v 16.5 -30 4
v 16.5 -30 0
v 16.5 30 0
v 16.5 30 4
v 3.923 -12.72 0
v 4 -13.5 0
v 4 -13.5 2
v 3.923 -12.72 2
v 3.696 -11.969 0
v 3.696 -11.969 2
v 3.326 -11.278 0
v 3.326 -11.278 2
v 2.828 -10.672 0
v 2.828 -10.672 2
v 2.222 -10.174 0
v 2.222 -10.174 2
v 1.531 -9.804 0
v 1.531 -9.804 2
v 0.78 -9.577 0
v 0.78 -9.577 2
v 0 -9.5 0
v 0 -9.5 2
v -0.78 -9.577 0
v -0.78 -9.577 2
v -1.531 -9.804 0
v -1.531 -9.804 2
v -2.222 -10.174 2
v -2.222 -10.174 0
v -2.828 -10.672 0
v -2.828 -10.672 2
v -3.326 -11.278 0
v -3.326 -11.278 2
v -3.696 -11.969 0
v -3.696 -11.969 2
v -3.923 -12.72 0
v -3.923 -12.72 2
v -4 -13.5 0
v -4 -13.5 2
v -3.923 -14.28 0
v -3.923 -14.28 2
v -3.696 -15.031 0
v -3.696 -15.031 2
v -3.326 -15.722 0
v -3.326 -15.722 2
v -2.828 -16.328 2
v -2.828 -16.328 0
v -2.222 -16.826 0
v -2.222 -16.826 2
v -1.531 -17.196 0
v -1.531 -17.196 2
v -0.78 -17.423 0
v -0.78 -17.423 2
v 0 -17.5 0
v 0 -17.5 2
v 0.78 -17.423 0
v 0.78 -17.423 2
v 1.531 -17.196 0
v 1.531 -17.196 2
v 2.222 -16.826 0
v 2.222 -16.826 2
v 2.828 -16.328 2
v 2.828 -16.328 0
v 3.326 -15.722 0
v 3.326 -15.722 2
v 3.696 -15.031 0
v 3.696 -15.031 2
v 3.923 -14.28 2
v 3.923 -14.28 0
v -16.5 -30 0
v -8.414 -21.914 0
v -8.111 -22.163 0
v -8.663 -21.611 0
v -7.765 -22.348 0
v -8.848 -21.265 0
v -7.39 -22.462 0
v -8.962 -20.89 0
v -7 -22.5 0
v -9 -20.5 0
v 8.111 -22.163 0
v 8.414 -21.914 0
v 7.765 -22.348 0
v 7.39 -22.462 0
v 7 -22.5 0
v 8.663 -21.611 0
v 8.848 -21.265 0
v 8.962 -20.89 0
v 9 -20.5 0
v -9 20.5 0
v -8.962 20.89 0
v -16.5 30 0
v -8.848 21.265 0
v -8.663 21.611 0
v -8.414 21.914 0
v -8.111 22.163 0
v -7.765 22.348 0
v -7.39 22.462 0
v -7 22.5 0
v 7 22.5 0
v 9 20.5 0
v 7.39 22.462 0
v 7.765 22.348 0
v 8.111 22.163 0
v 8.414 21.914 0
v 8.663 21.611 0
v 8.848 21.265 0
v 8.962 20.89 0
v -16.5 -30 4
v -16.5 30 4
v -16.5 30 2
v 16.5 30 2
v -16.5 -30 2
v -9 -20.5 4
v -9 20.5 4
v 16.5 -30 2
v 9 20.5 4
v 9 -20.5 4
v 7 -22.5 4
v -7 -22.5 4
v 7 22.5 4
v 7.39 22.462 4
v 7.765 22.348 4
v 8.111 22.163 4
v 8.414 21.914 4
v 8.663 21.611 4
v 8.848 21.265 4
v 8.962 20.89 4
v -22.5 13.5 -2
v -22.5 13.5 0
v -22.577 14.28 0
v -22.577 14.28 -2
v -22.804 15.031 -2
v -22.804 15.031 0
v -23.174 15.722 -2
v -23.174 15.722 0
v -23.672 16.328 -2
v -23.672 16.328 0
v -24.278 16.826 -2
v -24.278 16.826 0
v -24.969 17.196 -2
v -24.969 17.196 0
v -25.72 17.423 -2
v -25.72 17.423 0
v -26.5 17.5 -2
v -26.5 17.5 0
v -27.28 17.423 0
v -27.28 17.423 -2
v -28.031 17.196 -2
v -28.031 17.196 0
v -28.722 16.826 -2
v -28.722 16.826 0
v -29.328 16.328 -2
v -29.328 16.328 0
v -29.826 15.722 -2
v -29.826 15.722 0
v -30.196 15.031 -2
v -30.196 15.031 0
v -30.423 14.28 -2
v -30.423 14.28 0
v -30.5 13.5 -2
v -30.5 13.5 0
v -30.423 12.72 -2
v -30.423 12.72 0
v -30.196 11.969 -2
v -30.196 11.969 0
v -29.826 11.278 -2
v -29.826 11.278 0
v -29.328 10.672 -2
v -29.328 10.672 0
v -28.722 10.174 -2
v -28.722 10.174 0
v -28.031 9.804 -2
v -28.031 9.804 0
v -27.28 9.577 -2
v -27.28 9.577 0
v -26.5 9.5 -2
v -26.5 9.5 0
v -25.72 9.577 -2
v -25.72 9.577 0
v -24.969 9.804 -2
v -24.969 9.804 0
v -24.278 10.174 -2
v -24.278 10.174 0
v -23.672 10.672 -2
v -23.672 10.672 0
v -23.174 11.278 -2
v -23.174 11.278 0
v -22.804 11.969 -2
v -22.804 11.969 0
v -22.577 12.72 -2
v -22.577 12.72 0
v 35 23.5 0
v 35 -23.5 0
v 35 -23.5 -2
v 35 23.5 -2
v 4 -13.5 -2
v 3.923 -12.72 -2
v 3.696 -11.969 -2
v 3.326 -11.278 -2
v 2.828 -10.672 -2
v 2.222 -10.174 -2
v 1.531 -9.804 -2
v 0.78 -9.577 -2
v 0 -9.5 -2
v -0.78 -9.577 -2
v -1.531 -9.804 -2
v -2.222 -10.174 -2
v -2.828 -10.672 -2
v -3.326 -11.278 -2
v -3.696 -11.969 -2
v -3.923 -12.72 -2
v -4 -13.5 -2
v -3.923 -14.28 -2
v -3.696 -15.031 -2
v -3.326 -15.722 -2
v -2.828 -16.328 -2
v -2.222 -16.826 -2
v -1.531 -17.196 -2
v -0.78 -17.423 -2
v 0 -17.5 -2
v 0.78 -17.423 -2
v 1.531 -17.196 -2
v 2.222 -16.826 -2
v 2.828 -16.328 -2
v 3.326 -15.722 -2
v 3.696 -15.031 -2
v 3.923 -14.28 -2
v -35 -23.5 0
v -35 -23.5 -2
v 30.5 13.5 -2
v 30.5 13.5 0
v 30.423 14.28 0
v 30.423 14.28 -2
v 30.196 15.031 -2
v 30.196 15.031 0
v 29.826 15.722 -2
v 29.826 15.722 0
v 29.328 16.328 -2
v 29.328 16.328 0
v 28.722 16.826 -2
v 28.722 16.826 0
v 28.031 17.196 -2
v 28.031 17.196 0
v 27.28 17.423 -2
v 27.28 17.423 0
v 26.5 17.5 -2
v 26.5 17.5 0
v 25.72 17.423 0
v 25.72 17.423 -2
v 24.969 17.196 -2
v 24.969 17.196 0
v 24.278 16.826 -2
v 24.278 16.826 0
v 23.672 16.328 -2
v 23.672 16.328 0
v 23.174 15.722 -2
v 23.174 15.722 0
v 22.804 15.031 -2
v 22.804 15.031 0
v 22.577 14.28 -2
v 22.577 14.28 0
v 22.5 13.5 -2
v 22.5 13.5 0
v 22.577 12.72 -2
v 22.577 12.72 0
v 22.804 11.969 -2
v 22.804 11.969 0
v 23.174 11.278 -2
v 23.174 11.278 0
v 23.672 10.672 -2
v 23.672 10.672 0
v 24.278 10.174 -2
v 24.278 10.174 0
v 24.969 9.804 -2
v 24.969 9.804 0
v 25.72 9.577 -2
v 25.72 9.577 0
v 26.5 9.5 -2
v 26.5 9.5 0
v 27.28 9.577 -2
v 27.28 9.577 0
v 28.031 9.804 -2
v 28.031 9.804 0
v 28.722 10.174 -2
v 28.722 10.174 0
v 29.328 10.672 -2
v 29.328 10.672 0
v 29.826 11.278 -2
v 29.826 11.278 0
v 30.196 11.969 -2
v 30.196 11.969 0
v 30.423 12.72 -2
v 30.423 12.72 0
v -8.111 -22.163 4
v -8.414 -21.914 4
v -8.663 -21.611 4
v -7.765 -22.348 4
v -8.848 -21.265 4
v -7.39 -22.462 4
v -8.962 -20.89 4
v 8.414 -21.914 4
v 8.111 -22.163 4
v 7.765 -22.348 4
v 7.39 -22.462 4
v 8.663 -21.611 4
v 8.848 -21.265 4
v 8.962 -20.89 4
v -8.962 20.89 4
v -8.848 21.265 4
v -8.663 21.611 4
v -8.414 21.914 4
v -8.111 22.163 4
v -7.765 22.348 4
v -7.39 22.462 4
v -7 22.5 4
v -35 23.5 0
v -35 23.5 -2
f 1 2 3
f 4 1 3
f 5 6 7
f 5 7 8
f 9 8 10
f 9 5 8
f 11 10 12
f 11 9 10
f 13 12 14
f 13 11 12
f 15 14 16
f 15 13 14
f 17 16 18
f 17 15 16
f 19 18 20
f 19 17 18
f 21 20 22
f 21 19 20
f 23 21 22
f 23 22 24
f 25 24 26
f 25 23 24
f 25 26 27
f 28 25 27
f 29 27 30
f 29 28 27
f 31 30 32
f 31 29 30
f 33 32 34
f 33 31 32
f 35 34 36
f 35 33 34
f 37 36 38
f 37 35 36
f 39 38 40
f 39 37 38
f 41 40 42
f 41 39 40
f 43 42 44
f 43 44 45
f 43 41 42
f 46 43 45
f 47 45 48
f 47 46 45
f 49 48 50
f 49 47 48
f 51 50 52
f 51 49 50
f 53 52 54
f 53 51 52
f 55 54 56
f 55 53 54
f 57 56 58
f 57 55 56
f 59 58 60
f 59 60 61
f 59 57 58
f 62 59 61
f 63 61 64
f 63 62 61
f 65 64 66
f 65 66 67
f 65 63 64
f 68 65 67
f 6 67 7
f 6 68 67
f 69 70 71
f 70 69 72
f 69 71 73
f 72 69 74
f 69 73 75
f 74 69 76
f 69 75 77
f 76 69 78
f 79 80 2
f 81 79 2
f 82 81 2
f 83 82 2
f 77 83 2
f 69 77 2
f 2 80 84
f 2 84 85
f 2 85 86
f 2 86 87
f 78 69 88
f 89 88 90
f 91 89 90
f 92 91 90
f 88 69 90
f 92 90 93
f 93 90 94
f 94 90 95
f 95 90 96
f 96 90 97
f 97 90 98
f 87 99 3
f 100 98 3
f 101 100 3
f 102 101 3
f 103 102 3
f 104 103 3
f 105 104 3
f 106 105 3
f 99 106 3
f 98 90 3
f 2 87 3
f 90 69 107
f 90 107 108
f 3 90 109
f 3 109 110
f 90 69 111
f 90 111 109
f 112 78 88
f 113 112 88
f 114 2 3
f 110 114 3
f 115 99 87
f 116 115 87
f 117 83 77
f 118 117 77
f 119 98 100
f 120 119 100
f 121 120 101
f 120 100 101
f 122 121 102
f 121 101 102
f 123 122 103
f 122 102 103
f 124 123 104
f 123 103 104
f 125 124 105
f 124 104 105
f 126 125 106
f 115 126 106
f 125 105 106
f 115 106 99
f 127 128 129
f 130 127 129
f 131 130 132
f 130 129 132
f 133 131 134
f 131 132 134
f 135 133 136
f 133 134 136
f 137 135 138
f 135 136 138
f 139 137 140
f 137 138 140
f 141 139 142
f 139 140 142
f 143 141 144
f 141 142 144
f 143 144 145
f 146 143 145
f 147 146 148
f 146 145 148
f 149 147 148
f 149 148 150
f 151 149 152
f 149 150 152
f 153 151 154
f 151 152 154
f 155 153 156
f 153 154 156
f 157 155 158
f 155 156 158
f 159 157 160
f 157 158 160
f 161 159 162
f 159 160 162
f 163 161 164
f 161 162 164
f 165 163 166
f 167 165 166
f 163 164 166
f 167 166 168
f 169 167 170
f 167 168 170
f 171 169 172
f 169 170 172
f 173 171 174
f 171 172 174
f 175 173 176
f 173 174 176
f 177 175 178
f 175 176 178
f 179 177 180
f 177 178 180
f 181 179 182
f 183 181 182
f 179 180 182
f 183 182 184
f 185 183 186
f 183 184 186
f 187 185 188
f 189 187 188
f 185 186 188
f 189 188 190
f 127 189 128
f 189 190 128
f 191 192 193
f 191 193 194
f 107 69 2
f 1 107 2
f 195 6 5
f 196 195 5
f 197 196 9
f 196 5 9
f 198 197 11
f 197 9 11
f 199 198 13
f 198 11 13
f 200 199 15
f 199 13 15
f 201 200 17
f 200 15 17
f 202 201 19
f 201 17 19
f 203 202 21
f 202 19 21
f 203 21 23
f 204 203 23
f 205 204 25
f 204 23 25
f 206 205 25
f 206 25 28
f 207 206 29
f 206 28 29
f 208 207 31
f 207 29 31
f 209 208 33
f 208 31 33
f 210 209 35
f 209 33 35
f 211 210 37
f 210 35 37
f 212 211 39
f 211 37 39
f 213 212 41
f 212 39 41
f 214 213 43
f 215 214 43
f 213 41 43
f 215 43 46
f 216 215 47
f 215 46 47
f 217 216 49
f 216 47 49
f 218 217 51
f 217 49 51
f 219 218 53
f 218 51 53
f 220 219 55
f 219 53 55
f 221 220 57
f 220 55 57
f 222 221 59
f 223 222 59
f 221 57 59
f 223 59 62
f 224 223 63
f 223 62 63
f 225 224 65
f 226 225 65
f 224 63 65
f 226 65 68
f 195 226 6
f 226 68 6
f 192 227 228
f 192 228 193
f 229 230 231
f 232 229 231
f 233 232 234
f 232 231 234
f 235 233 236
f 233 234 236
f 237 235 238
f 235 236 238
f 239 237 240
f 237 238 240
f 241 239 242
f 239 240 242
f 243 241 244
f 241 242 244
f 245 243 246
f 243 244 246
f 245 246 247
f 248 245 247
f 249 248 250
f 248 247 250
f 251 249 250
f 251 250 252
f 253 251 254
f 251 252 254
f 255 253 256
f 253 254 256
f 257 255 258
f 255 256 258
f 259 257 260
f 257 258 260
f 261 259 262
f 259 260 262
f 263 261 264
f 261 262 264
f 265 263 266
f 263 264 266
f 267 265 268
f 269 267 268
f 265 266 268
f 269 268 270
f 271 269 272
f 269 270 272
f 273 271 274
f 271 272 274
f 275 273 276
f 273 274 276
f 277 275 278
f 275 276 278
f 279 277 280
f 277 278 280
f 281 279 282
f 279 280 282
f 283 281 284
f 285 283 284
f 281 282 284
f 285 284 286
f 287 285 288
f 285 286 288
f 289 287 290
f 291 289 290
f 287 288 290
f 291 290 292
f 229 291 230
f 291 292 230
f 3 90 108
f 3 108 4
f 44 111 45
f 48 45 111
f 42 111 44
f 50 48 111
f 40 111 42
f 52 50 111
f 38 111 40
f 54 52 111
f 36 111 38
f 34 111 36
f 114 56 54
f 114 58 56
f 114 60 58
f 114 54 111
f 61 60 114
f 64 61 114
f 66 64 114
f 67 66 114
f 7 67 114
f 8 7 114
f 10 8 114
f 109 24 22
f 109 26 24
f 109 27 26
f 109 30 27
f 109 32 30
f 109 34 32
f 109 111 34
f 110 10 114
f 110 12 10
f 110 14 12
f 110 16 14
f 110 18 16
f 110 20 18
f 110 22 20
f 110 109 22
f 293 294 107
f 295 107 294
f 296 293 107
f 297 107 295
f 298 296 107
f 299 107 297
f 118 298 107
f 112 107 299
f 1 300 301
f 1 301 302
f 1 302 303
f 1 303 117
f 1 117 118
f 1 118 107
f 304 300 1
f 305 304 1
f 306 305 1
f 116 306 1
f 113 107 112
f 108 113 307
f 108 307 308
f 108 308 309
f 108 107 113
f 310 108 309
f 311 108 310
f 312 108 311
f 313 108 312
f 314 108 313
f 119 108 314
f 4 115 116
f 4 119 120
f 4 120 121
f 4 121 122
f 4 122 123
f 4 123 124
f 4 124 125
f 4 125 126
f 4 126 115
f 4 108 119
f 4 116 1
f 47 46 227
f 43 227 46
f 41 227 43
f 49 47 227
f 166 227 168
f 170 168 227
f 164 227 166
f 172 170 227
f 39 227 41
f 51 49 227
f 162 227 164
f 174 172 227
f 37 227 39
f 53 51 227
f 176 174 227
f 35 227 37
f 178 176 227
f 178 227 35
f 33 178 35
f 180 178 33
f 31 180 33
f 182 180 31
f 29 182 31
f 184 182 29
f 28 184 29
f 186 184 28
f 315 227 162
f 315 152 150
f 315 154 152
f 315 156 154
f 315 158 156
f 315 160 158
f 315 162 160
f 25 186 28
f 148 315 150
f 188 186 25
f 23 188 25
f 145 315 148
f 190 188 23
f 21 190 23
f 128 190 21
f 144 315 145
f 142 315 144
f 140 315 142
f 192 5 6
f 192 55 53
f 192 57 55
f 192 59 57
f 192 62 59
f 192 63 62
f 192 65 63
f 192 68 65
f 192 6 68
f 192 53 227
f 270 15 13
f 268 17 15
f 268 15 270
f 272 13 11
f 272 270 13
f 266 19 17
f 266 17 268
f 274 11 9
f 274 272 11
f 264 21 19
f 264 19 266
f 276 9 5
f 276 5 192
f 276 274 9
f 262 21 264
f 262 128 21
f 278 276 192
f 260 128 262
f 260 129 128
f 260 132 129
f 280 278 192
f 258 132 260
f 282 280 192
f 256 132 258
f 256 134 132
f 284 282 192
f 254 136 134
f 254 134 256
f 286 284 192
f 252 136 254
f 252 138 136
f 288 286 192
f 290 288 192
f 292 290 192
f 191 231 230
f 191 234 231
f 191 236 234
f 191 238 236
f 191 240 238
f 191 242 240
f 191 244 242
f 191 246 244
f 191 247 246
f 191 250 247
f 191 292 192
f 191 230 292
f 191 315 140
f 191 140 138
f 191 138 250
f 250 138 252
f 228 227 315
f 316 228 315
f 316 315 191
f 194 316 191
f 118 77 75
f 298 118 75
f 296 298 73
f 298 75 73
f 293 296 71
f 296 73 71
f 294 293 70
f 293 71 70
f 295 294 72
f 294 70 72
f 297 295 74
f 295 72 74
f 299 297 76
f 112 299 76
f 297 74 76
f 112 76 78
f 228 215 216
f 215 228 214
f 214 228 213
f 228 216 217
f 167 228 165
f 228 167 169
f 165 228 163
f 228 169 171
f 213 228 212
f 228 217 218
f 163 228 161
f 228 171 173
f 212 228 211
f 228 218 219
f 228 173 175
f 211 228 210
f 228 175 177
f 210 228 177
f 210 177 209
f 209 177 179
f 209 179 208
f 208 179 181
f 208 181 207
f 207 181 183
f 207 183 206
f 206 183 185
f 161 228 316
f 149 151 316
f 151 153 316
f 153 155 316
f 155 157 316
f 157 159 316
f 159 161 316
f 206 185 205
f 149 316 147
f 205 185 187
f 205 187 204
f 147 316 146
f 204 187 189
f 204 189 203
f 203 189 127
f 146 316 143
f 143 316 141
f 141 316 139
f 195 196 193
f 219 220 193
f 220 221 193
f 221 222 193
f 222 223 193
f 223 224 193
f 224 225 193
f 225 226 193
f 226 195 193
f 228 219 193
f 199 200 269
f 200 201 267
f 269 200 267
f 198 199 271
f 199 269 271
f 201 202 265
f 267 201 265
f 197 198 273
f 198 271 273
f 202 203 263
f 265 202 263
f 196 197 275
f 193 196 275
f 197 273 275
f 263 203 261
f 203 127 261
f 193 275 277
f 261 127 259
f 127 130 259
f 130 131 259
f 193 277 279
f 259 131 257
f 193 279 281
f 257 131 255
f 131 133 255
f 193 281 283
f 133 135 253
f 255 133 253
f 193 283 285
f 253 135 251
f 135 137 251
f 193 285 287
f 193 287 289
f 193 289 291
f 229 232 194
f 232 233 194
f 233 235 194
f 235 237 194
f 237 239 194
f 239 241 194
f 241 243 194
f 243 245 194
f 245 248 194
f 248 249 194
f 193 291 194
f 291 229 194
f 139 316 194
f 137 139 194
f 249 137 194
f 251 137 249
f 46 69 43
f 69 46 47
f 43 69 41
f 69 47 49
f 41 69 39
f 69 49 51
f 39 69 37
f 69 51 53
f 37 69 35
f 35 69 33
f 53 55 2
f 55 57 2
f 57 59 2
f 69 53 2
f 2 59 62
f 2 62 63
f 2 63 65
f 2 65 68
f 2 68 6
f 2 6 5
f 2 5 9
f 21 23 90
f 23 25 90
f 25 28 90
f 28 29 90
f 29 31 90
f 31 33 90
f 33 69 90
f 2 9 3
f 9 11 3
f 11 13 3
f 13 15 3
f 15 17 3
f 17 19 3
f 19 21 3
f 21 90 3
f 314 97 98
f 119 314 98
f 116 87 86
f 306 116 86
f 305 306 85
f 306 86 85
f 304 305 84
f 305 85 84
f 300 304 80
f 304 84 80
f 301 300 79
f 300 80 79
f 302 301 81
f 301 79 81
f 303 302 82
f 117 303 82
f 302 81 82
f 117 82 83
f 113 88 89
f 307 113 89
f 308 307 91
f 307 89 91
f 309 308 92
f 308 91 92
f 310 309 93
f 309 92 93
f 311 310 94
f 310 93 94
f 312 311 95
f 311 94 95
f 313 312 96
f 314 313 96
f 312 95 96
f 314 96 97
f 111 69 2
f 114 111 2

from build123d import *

# Parameters (mm, degrees)
F0_W     = 70
F0_H     = 47
F0_R     = 4
F2_DEPTH = 2
F3_W     = 33
F3_H     = 60
F3_R     = 4
F4_DEPTH = 2
F1_W     = 33
F1_H     = 60
F5_DEPTH = 4


with BuildPart() as f2:
    # F0 (on Top) → F2 (new body)
    with BuildSketch(Plane.XY):
        Rectangle(F0_W, F0_H)
        with Locations((0, -13.5)):
            Circle(F0_R, mode=Mode.SUBTRACT)
        with Locations((-26.5, 13.5)):
            Circle(F0_R, mode=Mode.SUBTRACT)
        with Locations((26.5, 13.5)):
            Circle(F0_R, mode=Mode.SUBTRACT)
    extrude(amount=-F2_DEPTH)


with BuildPart() as f4:
    # F3 (on Top) → F4 (new body)
    with BuildSketch(Plane.XY):
        Rectangle(F3_W, F3_H)
        with Locations((0, -13.5)):
            Circle(F3_R, mode=Mode.SUBTRACT)
    extrude(amount=F4_DEPTH)


with BuildPart() as f5:
    # F1 (on Top) → F5 (new body)
    with BuildSketch(Plane.XY):
        Rectangle(F1_W, F1_H)
        with BuildLine():
            ThreePointArc((9, -20.5), (8.414214, -21.914214), (7, -22.5))
            Line((7, -22.5), (-7, -22.5))
            ThreePointArc((-7, -22.5), (-8.414214, -21.914214), (-9, -20.5))
            Line((-9, -20.5), (-9, 20.5))
            ThreePointArc((-9, 20.5), (-8.414214, 21.914214), (-7, 22.5))
            Line((-7, 22.5), (7, 22.5))
            ThreePointArc((7, 22.5), (8.414214, 21.914214), (9, 20.5))
            Line((9, 20.5), (9, -20.5))
        make_face(mode=Mode.SUBTRACT)
    extrude(amount=F5_DEPTH)


solid = Compound([f2.part, f4.part, f5.part])
